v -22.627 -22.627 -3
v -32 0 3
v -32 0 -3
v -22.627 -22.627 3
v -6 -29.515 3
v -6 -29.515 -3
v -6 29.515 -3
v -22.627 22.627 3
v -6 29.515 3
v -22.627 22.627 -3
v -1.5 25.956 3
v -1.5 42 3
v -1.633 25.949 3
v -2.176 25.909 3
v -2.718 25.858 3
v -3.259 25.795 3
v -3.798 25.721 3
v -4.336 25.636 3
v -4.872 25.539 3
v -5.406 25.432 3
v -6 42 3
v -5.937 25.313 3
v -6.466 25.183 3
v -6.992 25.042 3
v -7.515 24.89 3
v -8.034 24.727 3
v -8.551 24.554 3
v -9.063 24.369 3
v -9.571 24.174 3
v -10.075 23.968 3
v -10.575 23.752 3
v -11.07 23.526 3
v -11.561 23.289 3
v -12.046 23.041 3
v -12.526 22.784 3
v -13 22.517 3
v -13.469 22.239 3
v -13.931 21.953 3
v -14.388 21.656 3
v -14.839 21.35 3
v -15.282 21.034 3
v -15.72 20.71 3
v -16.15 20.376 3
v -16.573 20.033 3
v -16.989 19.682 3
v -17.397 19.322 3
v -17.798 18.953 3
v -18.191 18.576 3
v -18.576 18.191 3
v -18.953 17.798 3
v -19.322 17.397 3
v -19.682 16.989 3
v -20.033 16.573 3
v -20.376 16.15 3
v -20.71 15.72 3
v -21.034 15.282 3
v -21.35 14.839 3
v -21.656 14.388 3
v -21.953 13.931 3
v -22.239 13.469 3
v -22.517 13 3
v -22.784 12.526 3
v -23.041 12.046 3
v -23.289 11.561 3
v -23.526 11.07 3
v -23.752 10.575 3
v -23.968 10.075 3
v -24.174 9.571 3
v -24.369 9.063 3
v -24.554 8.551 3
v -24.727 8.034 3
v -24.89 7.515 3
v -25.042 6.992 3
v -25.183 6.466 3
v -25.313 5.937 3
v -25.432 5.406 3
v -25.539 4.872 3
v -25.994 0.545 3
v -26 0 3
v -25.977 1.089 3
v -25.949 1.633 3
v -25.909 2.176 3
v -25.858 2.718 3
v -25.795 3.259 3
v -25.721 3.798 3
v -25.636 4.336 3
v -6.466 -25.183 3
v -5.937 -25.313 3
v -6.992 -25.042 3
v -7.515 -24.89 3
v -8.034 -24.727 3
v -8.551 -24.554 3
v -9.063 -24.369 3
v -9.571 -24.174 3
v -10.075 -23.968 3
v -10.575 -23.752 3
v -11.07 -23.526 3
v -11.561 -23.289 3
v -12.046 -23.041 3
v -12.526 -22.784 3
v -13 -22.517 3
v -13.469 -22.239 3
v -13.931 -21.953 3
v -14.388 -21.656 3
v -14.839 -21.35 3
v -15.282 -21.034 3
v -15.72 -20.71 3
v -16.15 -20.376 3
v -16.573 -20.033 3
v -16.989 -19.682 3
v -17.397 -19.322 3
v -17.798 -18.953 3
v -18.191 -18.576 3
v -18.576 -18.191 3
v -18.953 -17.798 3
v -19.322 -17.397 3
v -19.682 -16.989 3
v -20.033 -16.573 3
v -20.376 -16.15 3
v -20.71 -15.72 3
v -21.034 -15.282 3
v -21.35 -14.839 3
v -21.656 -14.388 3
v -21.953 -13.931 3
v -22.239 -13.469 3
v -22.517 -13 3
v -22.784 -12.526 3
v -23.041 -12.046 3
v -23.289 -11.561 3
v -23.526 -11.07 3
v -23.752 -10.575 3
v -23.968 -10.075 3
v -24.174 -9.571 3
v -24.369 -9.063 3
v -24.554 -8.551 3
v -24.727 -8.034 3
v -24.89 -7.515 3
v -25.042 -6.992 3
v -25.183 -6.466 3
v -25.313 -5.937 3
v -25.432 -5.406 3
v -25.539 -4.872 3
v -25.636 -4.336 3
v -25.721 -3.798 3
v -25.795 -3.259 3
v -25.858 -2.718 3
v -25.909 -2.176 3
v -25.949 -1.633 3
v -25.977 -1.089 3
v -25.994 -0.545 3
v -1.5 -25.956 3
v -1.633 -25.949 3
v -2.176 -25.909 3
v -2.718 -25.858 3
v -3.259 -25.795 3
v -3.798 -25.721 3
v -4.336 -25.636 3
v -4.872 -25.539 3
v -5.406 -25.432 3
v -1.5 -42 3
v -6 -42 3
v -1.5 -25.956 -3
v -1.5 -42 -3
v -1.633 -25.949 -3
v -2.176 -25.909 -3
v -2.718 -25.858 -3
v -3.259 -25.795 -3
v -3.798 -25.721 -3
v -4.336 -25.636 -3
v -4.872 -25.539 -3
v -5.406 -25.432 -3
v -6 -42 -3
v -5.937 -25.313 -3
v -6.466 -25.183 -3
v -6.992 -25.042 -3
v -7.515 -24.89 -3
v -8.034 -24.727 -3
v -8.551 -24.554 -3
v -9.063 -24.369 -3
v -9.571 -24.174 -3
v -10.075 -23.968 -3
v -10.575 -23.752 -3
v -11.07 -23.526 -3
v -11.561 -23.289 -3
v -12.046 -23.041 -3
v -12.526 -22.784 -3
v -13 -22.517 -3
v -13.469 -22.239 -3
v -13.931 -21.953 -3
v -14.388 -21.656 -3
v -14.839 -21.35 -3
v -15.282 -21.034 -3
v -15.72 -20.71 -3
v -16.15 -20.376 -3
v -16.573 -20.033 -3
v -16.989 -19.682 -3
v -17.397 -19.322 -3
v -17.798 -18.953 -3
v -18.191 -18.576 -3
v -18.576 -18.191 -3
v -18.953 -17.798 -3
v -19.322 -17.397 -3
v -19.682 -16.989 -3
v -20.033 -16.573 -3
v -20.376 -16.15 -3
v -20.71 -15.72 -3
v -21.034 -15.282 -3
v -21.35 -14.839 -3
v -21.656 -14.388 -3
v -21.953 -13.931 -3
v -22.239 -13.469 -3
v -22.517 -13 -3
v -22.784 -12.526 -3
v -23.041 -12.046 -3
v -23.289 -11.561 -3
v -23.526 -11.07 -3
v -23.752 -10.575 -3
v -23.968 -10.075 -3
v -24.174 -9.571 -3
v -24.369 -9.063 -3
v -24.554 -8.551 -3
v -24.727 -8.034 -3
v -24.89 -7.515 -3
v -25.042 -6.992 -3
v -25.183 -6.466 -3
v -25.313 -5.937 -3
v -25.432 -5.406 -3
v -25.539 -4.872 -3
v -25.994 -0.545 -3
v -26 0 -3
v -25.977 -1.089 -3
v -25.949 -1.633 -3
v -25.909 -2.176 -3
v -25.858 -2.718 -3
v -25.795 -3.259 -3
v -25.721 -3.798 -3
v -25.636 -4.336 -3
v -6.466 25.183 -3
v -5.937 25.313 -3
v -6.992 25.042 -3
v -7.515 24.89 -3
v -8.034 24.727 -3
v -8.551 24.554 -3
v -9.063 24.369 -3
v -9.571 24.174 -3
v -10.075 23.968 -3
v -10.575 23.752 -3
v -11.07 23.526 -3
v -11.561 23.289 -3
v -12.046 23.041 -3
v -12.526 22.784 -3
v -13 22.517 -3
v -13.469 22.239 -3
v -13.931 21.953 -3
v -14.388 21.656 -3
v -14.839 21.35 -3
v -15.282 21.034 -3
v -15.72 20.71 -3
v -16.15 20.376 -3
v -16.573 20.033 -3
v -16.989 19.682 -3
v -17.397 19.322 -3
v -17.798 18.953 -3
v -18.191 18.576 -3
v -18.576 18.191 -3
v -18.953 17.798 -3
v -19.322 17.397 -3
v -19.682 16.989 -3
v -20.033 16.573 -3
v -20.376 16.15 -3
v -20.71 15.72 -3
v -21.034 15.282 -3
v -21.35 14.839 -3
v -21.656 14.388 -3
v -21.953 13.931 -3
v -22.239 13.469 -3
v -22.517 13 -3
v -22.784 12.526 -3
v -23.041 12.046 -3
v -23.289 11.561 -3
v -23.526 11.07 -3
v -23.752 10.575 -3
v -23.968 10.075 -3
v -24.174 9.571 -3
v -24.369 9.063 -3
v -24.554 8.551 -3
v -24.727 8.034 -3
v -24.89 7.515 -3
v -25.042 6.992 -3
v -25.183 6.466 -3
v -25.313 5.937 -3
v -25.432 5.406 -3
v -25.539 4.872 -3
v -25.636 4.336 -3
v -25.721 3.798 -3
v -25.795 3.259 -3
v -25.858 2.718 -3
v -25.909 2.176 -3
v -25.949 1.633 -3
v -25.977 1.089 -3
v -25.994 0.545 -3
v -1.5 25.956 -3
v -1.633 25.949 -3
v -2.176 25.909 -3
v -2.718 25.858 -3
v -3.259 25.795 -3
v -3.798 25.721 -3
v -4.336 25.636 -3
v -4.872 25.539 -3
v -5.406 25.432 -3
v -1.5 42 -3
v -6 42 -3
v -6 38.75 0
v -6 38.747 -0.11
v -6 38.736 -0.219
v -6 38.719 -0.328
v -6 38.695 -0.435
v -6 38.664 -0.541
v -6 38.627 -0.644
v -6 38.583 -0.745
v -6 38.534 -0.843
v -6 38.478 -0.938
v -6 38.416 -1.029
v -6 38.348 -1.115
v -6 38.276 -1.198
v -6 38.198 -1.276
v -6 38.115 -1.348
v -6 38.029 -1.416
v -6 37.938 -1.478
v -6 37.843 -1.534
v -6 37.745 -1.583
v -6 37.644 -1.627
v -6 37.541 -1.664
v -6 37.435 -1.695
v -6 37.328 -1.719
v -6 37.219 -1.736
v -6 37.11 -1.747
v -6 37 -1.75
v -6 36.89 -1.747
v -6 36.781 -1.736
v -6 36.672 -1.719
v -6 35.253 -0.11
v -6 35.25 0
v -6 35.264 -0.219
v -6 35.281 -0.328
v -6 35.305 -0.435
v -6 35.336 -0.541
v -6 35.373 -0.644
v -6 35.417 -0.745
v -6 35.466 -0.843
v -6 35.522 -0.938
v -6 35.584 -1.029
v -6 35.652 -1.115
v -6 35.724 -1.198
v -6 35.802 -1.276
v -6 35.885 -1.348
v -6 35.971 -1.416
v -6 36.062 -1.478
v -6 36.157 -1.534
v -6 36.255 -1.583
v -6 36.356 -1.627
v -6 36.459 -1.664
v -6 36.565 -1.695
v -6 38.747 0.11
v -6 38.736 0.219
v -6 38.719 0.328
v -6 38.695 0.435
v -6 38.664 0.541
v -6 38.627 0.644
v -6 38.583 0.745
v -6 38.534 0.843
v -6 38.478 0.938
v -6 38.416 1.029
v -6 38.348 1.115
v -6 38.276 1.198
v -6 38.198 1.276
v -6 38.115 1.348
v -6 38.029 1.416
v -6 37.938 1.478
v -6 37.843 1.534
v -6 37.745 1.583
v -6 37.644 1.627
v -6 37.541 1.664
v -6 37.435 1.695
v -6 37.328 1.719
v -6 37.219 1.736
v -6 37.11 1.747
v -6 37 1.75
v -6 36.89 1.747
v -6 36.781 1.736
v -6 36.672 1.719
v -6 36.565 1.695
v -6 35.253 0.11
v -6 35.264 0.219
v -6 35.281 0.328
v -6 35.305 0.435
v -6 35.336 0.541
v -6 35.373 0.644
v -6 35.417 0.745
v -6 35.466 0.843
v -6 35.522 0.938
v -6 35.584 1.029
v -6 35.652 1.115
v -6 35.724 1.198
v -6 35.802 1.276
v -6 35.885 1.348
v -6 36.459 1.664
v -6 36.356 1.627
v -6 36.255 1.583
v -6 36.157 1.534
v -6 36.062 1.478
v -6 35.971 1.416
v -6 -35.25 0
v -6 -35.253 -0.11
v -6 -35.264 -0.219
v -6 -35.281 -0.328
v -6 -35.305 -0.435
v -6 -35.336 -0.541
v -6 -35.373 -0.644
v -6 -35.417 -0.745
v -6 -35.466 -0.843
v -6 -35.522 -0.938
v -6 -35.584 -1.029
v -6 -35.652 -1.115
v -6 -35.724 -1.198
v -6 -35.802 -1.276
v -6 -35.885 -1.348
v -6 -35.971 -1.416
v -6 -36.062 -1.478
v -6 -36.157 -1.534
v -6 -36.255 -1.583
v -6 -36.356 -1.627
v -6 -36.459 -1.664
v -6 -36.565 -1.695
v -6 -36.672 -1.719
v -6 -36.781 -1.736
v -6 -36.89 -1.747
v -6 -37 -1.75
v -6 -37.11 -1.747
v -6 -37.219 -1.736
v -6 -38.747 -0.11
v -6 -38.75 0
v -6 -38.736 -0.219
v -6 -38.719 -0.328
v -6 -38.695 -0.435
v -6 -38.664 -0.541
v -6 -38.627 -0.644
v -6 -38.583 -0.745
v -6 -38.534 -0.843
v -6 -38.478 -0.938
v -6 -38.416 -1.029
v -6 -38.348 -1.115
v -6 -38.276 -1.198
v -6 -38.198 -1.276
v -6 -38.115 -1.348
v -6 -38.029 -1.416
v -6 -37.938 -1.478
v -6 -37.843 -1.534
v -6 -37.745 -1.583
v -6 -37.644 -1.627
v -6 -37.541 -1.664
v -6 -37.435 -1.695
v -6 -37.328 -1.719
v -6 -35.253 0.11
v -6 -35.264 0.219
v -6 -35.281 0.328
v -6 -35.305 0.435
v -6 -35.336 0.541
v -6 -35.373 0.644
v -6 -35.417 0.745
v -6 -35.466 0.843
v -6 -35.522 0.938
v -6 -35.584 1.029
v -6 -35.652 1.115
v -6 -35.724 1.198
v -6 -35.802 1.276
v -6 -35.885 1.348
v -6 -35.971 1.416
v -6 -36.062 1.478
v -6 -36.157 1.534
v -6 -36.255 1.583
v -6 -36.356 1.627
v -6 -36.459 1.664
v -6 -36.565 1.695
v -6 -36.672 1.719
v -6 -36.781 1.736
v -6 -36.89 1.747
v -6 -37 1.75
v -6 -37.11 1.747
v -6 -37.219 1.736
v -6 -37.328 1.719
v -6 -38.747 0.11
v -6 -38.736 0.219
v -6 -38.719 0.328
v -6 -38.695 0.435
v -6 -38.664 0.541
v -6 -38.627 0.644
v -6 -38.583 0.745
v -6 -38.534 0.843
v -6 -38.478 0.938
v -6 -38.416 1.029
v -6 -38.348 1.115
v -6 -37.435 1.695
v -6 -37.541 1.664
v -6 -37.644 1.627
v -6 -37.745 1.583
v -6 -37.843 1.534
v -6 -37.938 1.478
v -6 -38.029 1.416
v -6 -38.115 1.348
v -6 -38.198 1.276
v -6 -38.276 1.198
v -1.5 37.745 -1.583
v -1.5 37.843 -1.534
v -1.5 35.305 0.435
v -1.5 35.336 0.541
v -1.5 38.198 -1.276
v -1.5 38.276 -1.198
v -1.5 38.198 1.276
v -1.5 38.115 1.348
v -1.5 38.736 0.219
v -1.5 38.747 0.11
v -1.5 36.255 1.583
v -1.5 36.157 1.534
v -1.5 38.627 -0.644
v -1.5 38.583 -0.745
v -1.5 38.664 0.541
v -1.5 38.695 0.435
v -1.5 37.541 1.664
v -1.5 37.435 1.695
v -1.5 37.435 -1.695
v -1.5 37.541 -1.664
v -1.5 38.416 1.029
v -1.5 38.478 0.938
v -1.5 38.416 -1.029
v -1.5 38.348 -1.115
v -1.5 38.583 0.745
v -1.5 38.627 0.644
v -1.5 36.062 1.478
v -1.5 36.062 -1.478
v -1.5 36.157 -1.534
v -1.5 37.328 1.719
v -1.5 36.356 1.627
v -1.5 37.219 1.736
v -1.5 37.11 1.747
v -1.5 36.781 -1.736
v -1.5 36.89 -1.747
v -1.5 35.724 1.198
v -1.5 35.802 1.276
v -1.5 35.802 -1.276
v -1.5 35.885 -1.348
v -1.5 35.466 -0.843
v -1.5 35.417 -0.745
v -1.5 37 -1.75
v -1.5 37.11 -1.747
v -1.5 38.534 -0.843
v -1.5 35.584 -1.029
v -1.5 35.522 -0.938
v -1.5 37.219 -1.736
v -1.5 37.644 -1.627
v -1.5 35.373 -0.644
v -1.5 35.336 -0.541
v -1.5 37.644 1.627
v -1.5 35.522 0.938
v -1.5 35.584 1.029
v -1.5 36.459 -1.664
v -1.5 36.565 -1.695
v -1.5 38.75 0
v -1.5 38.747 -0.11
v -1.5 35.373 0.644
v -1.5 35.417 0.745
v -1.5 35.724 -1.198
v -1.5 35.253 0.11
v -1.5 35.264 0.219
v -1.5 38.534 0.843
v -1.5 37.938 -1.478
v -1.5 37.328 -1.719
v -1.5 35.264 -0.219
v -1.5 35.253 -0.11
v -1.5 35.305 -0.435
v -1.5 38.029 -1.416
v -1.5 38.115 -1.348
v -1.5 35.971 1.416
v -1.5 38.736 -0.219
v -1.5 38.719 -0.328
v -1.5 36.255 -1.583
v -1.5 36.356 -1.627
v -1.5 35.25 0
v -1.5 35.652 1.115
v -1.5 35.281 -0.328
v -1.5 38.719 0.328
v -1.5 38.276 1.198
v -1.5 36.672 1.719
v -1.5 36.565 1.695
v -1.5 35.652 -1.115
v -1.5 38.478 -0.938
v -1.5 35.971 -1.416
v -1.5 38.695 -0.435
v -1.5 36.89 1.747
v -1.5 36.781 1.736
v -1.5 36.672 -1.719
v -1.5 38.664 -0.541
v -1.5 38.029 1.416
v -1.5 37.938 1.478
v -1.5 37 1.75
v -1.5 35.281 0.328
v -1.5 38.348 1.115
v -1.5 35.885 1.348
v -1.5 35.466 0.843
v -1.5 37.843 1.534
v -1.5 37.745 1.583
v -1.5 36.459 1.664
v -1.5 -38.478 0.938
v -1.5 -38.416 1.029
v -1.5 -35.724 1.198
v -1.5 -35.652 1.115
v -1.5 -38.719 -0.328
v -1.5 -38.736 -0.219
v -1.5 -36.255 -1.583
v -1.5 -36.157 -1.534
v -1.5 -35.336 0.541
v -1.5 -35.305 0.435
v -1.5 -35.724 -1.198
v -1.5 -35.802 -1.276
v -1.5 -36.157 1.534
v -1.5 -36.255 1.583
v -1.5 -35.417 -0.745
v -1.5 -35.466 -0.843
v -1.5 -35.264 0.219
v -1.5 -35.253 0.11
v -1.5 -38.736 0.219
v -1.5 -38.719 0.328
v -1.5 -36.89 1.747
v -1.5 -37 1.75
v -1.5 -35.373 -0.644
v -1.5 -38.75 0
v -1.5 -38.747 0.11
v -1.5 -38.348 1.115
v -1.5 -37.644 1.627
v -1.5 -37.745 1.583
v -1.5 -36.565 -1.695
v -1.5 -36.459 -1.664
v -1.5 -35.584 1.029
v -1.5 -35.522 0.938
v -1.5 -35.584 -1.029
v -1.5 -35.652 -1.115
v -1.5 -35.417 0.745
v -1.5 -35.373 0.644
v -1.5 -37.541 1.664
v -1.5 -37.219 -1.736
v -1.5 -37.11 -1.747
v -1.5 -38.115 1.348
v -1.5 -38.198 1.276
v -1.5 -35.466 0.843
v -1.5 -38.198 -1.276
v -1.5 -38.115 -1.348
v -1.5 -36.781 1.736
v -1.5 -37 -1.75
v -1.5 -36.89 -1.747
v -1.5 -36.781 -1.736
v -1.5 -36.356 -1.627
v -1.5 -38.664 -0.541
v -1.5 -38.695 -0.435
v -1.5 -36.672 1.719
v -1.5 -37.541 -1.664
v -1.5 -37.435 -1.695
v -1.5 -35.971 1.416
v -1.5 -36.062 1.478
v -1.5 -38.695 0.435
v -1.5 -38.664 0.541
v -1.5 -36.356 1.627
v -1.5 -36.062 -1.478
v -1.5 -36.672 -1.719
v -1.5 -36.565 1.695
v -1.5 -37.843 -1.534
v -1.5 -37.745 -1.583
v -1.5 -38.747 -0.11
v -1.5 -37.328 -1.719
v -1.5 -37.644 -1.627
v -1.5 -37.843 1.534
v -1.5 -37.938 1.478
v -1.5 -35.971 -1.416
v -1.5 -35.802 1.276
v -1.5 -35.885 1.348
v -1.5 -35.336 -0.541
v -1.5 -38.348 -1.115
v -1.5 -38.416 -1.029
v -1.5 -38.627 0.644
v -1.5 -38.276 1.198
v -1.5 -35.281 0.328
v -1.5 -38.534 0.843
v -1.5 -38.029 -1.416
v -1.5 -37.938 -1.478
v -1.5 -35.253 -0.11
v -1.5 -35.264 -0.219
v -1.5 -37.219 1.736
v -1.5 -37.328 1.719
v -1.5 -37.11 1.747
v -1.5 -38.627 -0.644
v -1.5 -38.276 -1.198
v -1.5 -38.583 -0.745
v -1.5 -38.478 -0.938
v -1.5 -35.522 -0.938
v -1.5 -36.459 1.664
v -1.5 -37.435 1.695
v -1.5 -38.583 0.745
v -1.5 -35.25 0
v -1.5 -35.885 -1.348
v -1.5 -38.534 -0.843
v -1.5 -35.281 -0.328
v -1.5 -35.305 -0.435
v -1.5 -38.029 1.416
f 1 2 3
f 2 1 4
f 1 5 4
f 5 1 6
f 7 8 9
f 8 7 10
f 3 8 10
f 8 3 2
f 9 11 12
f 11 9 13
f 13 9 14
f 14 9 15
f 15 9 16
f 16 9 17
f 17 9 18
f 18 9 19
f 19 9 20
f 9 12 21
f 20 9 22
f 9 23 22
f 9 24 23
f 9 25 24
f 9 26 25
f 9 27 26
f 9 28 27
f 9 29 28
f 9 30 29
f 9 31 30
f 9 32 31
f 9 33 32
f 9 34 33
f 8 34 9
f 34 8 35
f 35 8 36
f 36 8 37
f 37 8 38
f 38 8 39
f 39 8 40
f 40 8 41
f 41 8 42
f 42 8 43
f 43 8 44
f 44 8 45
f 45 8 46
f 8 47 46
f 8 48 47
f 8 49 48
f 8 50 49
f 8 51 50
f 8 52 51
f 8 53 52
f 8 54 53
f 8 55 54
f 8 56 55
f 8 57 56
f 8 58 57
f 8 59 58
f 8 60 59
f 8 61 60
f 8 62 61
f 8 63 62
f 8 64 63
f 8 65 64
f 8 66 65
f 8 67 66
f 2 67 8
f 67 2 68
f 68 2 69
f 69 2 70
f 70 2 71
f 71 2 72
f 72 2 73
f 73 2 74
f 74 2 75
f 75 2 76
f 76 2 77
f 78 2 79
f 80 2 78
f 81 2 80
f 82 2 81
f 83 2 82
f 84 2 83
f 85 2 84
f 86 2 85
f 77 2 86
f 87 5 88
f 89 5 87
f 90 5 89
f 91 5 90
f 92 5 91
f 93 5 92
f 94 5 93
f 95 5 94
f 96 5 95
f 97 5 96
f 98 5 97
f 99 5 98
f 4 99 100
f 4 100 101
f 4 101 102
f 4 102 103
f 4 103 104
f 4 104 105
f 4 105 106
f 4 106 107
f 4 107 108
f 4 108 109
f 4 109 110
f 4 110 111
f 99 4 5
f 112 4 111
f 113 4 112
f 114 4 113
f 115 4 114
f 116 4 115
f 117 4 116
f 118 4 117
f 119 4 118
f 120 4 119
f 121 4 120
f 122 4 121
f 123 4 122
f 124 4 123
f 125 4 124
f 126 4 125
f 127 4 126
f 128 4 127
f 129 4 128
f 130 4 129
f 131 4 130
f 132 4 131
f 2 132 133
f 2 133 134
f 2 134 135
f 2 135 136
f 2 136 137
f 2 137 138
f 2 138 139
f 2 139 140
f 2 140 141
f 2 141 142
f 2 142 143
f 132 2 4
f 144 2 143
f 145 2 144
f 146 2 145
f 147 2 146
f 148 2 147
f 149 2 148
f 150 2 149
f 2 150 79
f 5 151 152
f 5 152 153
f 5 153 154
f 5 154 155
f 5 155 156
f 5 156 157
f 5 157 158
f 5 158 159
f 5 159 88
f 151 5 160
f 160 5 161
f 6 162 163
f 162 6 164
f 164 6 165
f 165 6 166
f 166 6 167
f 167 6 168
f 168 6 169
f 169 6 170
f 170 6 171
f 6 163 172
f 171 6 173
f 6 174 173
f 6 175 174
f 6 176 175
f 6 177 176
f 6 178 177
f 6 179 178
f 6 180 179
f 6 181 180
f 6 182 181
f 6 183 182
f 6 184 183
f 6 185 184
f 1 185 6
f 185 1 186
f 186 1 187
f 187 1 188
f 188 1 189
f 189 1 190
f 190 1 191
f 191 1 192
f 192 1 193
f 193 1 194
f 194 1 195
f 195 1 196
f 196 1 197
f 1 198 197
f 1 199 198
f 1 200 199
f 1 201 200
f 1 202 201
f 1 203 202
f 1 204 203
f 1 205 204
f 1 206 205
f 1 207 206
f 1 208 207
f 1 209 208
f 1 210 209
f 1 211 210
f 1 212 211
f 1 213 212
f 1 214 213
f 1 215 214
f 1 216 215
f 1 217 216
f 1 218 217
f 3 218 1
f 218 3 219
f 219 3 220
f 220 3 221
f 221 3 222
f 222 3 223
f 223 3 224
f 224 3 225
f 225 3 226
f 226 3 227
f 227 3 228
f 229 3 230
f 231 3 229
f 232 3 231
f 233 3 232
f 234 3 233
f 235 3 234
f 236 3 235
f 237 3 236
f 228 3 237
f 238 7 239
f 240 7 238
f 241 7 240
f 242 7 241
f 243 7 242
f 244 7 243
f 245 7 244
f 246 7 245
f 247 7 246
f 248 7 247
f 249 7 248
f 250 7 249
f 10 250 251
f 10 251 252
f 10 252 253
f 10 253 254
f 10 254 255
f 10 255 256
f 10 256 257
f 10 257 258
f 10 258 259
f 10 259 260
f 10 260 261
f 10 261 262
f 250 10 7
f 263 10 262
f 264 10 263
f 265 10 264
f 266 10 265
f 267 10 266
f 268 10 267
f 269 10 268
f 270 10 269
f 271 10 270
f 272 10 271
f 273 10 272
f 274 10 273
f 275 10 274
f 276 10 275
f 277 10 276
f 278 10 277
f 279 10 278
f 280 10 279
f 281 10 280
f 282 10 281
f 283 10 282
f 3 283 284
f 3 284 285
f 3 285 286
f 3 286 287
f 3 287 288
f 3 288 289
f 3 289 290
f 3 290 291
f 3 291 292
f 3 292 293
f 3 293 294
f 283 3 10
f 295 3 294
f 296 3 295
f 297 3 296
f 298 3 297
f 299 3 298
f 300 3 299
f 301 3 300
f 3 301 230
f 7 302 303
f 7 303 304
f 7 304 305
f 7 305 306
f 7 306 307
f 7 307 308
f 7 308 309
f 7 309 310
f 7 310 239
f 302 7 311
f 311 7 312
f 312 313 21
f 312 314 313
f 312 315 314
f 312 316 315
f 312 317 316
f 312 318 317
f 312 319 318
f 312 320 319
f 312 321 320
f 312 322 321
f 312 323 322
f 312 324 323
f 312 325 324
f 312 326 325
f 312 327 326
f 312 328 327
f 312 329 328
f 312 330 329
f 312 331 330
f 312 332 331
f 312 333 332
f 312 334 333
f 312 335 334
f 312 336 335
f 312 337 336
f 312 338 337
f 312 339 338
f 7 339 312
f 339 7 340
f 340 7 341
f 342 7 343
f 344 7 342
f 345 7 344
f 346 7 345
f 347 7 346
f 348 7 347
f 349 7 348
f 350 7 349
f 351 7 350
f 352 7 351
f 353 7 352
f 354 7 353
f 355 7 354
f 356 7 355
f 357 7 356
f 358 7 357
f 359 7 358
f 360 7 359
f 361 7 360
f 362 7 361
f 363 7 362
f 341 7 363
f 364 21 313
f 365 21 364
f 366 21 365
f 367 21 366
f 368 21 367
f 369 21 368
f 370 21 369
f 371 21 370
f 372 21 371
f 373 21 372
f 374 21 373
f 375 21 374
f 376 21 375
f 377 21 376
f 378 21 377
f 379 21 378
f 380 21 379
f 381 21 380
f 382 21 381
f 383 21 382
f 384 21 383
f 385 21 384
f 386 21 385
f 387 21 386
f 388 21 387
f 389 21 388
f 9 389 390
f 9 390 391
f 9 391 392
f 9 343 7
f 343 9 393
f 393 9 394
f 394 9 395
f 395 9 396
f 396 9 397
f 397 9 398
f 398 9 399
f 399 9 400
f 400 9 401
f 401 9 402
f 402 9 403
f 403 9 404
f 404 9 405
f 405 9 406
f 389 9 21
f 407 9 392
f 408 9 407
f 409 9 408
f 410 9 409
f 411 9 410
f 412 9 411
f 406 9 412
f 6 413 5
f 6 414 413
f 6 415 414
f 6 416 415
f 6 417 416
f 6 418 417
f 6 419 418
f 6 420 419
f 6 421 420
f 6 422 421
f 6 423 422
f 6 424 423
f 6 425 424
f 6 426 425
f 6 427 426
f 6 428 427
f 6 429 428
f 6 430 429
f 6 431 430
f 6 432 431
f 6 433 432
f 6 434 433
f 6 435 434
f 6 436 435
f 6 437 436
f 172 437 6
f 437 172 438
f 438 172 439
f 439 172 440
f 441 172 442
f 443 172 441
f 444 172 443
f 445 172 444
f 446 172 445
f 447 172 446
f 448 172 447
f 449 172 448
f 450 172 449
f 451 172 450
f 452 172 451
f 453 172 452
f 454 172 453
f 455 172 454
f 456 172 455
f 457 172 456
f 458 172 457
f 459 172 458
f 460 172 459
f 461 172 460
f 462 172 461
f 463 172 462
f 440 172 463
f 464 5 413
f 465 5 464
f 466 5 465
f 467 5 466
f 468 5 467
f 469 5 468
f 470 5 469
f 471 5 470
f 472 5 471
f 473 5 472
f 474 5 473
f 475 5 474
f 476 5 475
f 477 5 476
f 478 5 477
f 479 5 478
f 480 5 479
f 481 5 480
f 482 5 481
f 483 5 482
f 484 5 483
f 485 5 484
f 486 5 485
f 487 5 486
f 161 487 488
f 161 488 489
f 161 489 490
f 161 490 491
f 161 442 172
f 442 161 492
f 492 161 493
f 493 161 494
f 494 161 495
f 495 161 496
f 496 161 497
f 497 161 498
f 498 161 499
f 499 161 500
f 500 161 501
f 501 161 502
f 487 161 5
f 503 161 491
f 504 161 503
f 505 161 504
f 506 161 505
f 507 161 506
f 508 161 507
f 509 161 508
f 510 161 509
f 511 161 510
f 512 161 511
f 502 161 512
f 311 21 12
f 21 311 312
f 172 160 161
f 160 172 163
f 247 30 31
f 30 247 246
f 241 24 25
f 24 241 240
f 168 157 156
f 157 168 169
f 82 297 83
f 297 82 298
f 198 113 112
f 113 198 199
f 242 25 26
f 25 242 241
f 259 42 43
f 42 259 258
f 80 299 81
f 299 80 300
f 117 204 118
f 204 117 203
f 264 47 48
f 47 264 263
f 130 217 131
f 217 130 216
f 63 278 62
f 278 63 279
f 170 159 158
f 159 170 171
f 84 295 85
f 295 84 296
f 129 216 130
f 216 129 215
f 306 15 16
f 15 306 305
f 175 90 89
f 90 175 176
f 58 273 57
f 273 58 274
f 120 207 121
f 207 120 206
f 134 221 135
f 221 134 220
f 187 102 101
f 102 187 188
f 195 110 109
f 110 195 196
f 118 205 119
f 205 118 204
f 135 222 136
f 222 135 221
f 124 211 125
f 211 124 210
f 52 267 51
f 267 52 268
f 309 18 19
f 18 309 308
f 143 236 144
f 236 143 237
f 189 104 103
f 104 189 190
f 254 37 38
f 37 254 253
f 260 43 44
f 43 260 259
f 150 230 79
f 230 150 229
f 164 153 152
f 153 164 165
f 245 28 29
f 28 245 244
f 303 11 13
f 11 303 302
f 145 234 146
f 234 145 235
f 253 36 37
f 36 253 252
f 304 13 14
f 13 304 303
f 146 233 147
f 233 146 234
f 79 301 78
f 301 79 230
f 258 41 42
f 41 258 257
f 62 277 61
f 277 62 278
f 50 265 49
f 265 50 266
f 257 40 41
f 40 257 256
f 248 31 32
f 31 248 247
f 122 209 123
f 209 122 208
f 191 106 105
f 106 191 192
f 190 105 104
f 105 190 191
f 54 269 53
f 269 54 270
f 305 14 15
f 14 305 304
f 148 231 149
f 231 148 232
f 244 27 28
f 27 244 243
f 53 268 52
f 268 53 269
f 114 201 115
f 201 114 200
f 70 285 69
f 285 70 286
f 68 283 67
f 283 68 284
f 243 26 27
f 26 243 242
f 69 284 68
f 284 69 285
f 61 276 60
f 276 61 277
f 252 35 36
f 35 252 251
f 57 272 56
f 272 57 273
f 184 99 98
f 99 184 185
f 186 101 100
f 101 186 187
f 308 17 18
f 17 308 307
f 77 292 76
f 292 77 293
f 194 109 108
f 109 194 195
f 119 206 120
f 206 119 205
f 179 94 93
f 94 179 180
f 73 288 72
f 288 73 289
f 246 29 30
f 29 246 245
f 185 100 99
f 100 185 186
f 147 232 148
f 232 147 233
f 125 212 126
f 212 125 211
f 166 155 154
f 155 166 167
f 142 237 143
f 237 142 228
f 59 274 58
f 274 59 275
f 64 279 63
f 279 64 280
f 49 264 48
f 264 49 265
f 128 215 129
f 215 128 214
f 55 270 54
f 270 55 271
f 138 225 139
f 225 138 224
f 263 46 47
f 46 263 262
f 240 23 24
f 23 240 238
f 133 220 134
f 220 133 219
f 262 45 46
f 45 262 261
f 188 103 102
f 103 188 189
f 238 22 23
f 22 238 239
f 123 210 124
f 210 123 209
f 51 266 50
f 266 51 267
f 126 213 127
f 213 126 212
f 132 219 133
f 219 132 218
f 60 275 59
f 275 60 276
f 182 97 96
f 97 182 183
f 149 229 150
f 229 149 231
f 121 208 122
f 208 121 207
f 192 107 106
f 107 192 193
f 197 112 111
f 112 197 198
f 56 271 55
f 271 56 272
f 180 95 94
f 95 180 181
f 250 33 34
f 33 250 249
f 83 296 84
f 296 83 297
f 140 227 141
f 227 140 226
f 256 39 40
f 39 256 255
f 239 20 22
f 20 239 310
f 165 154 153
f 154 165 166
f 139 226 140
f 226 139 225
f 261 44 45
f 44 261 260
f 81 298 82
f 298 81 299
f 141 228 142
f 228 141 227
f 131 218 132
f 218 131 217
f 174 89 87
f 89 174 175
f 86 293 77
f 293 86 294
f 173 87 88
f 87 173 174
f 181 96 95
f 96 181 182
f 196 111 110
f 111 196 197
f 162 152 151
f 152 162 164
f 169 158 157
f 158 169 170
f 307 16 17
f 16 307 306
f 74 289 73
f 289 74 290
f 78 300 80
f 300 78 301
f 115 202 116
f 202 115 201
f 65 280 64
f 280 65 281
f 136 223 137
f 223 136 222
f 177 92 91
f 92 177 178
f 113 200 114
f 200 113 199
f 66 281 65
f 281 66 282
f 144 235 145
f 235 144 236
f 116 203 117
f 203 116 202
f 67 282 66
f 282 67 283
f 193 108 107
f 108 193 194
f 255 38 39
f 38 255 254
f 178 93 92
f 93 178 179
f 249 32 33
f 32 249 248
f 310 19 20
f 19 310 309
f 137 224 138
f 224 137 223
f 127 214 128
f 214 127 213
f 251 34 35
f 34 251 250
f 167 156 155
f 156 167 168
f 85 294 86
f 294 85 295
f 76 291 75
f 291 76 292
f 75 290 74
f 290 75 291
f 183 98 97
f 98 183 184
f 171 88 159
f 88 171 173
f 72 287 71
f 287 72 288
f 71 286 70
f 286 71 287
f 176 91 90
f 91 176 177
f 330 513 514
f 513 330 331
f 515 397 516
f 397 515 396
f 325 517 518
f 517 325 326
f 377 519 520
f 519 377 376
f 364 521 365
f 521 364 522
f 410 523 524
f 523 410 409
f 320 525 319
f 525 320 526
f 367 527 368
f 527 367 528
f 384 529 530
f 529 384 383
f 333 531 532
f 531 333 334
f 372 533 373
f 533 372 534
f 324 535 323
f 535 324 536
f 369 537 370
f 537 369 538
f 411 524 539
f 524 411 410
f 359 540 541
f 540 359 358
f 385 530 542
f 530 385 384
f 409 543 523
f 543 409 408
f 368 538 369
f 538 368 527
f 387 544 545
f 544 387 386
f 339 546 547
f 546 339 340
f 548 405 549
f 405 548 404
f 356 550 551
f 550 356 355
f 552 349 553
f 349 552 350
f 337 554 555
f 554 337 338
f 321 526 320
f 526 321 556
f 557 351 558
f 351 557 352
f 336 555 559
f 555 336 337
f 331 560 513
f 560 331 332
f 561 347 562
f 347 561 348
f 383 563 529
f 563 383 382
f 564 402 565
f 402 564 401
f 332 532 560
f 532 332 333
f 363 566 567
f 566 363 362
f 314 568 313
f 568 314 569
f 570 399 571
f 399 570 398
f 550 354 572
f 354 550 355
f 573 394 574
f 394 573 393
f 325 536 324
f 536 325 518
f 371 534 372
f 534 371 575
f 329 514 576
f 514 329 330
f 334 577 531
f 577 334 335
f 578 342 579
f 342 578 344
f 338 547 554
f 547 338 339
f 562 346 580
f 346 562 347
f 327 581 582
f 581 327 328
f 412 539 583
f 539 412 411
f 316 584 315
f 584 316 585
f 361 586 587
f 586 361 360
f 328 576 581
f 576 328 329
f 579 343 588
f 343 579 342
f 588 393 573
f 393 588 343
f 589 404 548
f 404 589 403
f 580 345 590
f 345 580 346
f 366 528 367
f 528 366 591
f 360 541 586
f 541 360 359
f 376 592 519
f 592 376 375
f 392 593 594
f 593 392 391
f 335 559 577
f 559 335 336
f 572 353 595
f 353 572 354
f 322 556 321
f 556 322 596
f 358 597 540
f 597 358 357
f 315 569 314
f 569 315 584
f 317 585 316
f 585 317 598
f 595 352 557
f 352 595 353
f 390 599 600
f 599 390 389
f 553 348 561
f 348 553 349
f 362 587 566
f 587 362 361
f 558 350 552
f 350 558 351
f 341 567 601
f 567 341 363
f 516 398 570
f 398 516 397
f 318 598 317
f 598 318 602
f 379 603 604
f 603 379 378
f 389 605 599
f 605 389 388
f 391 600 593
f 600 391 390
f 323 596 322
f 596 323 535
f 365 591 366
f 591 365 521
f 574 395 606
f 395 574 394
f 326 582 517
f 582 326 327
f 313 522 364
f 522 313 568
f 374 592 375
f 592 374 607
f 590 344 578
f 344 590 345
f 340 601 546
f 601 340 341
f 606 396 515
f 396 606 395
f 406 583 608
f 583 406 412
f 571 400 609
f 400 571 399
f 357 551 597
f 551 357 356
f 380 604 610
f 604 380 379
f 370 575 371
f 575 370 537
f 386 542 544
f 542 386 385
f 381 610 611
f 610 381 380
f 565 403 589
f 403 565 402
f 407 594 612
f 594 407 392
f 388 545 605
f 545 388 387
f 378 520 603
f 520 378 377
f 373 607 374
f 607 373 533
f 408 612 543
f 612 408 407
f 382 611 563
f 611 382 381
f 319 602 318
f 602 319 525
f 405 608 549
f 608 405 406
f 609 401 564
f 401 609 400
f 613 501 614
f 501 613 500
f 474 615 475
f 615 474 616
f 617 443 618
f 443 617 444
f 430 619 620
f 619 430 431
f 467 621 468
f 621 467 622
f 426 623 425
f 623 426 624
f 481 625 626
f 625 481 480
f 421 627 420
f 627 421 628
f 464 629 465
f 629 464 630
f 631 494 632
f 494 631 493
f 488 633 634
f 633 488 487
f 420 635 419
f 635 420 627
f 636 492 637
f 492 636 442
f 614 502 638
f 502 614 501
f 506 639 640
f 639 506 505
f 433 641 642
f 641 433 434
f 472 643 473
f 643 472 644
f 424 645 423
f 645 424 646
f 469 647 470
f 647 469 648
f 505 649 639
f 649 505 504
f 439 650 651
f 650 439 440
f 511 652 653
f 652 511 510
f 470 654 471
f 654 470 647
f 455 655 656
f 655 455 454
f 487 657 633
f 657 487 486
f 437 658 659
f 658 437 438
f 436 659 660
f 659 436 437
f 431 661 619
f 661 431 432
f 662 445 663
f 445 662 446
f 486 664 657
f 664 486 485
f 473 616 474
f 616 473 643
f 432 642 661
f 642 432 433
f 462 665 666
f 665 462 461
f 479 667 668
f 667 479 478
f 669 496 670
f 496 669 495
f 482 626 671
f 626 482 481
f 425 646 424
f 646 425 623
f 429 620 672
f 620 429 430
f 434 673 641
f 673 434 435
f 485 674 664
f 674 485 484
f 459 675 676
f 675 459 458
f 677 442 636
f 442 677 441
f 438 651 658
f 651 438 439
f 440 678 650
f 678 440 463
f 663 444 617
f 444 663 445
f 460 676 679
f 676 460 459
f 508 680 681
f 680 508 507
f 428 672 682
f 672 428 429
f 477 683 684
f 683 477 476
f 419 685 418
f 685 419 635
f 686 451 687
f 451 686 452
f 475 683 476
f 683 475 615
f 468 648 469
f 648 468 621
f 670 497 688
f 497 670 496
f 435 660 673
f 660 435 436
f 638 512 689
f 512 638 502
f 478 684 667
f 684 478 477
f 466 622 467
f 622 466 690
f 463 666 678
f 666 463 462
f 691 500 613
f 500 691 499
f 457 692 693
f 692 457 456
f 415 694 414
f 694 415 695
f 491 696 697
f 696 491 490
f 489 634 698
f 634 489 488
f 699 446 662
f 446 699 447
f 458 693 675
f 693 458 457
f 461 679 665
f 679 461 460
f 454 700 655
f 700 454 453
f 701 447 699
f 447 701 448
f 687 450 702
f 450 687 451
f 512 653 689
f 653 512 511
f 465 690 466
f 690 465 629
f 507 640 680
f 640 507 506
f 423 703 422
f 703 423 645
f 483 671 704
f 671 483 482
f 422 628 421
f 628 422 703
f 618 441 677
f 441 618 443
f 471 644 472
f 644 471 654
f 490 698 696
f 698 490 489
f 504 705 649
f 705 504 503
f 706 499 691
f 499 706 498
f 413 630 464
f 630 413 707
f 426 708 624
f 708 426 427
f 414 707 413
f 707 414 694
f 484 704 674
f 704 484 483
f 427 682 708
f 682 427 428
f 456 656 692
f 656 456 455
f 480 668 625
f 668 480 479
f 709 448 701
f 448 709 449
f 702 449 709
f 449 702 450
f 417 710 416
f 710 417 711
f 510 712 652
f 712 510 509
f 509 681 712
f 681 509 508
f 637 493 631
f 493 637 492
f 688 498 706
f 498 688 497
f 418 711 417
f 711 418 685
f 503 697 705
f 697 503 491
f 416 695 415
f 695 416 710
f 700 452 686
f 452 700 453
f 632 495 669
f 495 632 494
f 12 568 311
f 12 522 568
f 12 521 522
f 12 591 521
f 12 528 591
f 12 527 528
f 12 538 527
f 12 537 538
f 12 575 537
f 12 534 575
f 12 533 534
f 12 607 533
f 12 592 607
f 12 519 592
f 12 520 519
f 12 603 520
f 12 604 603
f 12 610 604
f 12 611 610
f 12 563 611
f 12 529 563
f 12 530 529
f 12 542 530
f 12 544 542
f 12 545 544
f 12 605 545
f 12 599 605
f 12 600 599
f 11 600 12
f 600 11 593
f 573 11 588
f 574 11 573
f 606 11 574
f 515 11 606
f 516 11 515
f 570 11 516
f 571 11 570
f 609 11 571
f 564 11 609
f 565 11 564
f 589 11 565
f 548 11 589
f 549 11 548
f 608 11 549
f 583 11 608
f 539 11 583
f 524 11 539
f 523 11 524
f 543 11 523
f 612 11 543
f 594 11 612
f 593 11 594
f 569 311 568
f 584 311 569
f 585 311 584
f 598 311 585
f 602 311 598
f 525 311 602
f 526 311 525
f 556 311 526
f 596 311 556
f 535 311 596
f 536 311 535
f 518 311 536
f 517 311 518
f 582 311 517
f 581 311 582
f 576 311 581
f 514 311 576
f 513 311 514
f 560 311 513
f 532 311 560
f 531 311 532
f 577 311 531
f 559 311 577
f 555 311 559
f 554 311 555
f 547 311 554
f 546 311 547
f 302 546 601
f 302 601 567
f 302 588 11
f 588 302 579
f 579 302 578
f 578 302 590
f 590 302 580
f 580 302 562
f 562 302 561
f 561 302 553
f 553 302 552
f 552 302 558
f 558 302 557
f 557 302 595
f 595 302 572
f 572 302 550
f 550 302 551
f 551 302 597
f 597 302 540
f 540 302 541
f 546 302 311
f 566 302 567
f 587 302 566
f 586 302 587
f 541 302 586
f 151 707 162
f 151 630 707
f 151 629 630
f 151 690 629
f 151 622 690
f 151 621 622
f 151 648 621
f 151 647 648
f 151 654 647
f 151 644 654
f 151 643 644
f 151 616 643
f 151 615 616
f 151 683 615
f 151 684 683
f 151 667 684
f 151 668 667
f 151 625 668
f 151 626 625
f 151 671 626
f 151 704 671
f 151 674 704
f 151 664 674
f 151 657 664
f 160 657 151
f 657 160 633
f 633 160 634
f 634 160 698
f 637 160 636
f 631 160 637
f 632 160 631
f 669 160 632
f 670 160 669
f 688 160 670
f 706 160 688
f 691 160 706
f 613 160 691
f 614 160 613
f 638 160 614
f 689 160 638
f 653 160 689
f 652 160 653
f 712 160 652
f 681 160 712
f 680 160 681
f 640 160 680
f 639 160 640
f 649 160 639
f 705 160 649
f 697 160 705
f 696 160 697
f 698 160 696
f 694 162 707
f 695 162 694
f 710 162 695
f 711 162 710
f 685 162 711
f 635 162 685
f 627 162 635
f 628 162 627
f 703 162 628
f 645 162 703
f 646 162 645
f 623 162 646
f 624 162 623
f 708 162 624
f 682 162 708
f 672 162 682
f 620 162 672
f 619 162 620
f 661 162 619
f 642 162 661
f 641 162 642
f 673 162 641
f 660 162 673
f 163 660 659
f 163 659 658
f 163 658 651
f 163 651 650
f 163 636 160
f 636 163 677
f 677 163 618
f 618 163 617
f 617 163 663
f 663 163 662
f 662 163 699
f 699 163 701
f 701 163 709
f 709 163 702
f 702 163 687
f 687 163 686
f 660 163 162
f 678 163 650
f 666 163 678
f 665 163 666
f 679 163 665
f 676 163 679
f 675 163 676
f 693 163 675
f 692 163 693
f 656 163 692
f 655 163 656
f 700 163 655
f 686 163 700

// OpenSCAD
// file: params.scad
motorRadius = 26;
thickness = 6;
margin = 6;
scewHolderLeak = 10;
scewHolderLeakHeight = 12;
holeDiameter = 3.5;

midSeparatorThickness = 3;
// main file
include <params.scad>


cubeHeight = scewHolderLeakHeight;
cubeWidth = 2*motorRadius + 2*margin + 2*scewHolderLeak;

hole_x = (motorRadius + margin)  + scewHolderLeak/2;

hole_y = scewHolderLeakHeight/2;

HIDE_CUBE_SIDE=100;

difference(){

    
    union(){

        cylinder(r=motorRadius+margin, h=thickness, center=true, $fn=8);

        cube([cubeHeight, cubeWidth , thickness], center=true);
    }

    cylinder(r=motorRadius, h=thickness+10, center=true, $fn=300);


    rotate([0,90,0]) translate([0, hole_x, 0]) cylinder(r=holeDiameter/2, h=scewHolderLeakHeight+10, center=true, $fn=100);
    rotate([0,90,0]) translate([0, -hole_x, 0]) cylinder(r=holeDiameter/2, h=scewHolderLeakHeight+10, center=true, $fn=100);

    cube([midSeparatorThickness, cubeWidth + 10 , thickness+10], center=true);
    
    // Uncomment to hide
    translate([HIDE_CUBE_SIDE/2,0,0]) cube([HIDE_CUBE_SIDE,HIDE_CUBE_SIDE,HIDE_CUBE_SIDE], center=true);

}
